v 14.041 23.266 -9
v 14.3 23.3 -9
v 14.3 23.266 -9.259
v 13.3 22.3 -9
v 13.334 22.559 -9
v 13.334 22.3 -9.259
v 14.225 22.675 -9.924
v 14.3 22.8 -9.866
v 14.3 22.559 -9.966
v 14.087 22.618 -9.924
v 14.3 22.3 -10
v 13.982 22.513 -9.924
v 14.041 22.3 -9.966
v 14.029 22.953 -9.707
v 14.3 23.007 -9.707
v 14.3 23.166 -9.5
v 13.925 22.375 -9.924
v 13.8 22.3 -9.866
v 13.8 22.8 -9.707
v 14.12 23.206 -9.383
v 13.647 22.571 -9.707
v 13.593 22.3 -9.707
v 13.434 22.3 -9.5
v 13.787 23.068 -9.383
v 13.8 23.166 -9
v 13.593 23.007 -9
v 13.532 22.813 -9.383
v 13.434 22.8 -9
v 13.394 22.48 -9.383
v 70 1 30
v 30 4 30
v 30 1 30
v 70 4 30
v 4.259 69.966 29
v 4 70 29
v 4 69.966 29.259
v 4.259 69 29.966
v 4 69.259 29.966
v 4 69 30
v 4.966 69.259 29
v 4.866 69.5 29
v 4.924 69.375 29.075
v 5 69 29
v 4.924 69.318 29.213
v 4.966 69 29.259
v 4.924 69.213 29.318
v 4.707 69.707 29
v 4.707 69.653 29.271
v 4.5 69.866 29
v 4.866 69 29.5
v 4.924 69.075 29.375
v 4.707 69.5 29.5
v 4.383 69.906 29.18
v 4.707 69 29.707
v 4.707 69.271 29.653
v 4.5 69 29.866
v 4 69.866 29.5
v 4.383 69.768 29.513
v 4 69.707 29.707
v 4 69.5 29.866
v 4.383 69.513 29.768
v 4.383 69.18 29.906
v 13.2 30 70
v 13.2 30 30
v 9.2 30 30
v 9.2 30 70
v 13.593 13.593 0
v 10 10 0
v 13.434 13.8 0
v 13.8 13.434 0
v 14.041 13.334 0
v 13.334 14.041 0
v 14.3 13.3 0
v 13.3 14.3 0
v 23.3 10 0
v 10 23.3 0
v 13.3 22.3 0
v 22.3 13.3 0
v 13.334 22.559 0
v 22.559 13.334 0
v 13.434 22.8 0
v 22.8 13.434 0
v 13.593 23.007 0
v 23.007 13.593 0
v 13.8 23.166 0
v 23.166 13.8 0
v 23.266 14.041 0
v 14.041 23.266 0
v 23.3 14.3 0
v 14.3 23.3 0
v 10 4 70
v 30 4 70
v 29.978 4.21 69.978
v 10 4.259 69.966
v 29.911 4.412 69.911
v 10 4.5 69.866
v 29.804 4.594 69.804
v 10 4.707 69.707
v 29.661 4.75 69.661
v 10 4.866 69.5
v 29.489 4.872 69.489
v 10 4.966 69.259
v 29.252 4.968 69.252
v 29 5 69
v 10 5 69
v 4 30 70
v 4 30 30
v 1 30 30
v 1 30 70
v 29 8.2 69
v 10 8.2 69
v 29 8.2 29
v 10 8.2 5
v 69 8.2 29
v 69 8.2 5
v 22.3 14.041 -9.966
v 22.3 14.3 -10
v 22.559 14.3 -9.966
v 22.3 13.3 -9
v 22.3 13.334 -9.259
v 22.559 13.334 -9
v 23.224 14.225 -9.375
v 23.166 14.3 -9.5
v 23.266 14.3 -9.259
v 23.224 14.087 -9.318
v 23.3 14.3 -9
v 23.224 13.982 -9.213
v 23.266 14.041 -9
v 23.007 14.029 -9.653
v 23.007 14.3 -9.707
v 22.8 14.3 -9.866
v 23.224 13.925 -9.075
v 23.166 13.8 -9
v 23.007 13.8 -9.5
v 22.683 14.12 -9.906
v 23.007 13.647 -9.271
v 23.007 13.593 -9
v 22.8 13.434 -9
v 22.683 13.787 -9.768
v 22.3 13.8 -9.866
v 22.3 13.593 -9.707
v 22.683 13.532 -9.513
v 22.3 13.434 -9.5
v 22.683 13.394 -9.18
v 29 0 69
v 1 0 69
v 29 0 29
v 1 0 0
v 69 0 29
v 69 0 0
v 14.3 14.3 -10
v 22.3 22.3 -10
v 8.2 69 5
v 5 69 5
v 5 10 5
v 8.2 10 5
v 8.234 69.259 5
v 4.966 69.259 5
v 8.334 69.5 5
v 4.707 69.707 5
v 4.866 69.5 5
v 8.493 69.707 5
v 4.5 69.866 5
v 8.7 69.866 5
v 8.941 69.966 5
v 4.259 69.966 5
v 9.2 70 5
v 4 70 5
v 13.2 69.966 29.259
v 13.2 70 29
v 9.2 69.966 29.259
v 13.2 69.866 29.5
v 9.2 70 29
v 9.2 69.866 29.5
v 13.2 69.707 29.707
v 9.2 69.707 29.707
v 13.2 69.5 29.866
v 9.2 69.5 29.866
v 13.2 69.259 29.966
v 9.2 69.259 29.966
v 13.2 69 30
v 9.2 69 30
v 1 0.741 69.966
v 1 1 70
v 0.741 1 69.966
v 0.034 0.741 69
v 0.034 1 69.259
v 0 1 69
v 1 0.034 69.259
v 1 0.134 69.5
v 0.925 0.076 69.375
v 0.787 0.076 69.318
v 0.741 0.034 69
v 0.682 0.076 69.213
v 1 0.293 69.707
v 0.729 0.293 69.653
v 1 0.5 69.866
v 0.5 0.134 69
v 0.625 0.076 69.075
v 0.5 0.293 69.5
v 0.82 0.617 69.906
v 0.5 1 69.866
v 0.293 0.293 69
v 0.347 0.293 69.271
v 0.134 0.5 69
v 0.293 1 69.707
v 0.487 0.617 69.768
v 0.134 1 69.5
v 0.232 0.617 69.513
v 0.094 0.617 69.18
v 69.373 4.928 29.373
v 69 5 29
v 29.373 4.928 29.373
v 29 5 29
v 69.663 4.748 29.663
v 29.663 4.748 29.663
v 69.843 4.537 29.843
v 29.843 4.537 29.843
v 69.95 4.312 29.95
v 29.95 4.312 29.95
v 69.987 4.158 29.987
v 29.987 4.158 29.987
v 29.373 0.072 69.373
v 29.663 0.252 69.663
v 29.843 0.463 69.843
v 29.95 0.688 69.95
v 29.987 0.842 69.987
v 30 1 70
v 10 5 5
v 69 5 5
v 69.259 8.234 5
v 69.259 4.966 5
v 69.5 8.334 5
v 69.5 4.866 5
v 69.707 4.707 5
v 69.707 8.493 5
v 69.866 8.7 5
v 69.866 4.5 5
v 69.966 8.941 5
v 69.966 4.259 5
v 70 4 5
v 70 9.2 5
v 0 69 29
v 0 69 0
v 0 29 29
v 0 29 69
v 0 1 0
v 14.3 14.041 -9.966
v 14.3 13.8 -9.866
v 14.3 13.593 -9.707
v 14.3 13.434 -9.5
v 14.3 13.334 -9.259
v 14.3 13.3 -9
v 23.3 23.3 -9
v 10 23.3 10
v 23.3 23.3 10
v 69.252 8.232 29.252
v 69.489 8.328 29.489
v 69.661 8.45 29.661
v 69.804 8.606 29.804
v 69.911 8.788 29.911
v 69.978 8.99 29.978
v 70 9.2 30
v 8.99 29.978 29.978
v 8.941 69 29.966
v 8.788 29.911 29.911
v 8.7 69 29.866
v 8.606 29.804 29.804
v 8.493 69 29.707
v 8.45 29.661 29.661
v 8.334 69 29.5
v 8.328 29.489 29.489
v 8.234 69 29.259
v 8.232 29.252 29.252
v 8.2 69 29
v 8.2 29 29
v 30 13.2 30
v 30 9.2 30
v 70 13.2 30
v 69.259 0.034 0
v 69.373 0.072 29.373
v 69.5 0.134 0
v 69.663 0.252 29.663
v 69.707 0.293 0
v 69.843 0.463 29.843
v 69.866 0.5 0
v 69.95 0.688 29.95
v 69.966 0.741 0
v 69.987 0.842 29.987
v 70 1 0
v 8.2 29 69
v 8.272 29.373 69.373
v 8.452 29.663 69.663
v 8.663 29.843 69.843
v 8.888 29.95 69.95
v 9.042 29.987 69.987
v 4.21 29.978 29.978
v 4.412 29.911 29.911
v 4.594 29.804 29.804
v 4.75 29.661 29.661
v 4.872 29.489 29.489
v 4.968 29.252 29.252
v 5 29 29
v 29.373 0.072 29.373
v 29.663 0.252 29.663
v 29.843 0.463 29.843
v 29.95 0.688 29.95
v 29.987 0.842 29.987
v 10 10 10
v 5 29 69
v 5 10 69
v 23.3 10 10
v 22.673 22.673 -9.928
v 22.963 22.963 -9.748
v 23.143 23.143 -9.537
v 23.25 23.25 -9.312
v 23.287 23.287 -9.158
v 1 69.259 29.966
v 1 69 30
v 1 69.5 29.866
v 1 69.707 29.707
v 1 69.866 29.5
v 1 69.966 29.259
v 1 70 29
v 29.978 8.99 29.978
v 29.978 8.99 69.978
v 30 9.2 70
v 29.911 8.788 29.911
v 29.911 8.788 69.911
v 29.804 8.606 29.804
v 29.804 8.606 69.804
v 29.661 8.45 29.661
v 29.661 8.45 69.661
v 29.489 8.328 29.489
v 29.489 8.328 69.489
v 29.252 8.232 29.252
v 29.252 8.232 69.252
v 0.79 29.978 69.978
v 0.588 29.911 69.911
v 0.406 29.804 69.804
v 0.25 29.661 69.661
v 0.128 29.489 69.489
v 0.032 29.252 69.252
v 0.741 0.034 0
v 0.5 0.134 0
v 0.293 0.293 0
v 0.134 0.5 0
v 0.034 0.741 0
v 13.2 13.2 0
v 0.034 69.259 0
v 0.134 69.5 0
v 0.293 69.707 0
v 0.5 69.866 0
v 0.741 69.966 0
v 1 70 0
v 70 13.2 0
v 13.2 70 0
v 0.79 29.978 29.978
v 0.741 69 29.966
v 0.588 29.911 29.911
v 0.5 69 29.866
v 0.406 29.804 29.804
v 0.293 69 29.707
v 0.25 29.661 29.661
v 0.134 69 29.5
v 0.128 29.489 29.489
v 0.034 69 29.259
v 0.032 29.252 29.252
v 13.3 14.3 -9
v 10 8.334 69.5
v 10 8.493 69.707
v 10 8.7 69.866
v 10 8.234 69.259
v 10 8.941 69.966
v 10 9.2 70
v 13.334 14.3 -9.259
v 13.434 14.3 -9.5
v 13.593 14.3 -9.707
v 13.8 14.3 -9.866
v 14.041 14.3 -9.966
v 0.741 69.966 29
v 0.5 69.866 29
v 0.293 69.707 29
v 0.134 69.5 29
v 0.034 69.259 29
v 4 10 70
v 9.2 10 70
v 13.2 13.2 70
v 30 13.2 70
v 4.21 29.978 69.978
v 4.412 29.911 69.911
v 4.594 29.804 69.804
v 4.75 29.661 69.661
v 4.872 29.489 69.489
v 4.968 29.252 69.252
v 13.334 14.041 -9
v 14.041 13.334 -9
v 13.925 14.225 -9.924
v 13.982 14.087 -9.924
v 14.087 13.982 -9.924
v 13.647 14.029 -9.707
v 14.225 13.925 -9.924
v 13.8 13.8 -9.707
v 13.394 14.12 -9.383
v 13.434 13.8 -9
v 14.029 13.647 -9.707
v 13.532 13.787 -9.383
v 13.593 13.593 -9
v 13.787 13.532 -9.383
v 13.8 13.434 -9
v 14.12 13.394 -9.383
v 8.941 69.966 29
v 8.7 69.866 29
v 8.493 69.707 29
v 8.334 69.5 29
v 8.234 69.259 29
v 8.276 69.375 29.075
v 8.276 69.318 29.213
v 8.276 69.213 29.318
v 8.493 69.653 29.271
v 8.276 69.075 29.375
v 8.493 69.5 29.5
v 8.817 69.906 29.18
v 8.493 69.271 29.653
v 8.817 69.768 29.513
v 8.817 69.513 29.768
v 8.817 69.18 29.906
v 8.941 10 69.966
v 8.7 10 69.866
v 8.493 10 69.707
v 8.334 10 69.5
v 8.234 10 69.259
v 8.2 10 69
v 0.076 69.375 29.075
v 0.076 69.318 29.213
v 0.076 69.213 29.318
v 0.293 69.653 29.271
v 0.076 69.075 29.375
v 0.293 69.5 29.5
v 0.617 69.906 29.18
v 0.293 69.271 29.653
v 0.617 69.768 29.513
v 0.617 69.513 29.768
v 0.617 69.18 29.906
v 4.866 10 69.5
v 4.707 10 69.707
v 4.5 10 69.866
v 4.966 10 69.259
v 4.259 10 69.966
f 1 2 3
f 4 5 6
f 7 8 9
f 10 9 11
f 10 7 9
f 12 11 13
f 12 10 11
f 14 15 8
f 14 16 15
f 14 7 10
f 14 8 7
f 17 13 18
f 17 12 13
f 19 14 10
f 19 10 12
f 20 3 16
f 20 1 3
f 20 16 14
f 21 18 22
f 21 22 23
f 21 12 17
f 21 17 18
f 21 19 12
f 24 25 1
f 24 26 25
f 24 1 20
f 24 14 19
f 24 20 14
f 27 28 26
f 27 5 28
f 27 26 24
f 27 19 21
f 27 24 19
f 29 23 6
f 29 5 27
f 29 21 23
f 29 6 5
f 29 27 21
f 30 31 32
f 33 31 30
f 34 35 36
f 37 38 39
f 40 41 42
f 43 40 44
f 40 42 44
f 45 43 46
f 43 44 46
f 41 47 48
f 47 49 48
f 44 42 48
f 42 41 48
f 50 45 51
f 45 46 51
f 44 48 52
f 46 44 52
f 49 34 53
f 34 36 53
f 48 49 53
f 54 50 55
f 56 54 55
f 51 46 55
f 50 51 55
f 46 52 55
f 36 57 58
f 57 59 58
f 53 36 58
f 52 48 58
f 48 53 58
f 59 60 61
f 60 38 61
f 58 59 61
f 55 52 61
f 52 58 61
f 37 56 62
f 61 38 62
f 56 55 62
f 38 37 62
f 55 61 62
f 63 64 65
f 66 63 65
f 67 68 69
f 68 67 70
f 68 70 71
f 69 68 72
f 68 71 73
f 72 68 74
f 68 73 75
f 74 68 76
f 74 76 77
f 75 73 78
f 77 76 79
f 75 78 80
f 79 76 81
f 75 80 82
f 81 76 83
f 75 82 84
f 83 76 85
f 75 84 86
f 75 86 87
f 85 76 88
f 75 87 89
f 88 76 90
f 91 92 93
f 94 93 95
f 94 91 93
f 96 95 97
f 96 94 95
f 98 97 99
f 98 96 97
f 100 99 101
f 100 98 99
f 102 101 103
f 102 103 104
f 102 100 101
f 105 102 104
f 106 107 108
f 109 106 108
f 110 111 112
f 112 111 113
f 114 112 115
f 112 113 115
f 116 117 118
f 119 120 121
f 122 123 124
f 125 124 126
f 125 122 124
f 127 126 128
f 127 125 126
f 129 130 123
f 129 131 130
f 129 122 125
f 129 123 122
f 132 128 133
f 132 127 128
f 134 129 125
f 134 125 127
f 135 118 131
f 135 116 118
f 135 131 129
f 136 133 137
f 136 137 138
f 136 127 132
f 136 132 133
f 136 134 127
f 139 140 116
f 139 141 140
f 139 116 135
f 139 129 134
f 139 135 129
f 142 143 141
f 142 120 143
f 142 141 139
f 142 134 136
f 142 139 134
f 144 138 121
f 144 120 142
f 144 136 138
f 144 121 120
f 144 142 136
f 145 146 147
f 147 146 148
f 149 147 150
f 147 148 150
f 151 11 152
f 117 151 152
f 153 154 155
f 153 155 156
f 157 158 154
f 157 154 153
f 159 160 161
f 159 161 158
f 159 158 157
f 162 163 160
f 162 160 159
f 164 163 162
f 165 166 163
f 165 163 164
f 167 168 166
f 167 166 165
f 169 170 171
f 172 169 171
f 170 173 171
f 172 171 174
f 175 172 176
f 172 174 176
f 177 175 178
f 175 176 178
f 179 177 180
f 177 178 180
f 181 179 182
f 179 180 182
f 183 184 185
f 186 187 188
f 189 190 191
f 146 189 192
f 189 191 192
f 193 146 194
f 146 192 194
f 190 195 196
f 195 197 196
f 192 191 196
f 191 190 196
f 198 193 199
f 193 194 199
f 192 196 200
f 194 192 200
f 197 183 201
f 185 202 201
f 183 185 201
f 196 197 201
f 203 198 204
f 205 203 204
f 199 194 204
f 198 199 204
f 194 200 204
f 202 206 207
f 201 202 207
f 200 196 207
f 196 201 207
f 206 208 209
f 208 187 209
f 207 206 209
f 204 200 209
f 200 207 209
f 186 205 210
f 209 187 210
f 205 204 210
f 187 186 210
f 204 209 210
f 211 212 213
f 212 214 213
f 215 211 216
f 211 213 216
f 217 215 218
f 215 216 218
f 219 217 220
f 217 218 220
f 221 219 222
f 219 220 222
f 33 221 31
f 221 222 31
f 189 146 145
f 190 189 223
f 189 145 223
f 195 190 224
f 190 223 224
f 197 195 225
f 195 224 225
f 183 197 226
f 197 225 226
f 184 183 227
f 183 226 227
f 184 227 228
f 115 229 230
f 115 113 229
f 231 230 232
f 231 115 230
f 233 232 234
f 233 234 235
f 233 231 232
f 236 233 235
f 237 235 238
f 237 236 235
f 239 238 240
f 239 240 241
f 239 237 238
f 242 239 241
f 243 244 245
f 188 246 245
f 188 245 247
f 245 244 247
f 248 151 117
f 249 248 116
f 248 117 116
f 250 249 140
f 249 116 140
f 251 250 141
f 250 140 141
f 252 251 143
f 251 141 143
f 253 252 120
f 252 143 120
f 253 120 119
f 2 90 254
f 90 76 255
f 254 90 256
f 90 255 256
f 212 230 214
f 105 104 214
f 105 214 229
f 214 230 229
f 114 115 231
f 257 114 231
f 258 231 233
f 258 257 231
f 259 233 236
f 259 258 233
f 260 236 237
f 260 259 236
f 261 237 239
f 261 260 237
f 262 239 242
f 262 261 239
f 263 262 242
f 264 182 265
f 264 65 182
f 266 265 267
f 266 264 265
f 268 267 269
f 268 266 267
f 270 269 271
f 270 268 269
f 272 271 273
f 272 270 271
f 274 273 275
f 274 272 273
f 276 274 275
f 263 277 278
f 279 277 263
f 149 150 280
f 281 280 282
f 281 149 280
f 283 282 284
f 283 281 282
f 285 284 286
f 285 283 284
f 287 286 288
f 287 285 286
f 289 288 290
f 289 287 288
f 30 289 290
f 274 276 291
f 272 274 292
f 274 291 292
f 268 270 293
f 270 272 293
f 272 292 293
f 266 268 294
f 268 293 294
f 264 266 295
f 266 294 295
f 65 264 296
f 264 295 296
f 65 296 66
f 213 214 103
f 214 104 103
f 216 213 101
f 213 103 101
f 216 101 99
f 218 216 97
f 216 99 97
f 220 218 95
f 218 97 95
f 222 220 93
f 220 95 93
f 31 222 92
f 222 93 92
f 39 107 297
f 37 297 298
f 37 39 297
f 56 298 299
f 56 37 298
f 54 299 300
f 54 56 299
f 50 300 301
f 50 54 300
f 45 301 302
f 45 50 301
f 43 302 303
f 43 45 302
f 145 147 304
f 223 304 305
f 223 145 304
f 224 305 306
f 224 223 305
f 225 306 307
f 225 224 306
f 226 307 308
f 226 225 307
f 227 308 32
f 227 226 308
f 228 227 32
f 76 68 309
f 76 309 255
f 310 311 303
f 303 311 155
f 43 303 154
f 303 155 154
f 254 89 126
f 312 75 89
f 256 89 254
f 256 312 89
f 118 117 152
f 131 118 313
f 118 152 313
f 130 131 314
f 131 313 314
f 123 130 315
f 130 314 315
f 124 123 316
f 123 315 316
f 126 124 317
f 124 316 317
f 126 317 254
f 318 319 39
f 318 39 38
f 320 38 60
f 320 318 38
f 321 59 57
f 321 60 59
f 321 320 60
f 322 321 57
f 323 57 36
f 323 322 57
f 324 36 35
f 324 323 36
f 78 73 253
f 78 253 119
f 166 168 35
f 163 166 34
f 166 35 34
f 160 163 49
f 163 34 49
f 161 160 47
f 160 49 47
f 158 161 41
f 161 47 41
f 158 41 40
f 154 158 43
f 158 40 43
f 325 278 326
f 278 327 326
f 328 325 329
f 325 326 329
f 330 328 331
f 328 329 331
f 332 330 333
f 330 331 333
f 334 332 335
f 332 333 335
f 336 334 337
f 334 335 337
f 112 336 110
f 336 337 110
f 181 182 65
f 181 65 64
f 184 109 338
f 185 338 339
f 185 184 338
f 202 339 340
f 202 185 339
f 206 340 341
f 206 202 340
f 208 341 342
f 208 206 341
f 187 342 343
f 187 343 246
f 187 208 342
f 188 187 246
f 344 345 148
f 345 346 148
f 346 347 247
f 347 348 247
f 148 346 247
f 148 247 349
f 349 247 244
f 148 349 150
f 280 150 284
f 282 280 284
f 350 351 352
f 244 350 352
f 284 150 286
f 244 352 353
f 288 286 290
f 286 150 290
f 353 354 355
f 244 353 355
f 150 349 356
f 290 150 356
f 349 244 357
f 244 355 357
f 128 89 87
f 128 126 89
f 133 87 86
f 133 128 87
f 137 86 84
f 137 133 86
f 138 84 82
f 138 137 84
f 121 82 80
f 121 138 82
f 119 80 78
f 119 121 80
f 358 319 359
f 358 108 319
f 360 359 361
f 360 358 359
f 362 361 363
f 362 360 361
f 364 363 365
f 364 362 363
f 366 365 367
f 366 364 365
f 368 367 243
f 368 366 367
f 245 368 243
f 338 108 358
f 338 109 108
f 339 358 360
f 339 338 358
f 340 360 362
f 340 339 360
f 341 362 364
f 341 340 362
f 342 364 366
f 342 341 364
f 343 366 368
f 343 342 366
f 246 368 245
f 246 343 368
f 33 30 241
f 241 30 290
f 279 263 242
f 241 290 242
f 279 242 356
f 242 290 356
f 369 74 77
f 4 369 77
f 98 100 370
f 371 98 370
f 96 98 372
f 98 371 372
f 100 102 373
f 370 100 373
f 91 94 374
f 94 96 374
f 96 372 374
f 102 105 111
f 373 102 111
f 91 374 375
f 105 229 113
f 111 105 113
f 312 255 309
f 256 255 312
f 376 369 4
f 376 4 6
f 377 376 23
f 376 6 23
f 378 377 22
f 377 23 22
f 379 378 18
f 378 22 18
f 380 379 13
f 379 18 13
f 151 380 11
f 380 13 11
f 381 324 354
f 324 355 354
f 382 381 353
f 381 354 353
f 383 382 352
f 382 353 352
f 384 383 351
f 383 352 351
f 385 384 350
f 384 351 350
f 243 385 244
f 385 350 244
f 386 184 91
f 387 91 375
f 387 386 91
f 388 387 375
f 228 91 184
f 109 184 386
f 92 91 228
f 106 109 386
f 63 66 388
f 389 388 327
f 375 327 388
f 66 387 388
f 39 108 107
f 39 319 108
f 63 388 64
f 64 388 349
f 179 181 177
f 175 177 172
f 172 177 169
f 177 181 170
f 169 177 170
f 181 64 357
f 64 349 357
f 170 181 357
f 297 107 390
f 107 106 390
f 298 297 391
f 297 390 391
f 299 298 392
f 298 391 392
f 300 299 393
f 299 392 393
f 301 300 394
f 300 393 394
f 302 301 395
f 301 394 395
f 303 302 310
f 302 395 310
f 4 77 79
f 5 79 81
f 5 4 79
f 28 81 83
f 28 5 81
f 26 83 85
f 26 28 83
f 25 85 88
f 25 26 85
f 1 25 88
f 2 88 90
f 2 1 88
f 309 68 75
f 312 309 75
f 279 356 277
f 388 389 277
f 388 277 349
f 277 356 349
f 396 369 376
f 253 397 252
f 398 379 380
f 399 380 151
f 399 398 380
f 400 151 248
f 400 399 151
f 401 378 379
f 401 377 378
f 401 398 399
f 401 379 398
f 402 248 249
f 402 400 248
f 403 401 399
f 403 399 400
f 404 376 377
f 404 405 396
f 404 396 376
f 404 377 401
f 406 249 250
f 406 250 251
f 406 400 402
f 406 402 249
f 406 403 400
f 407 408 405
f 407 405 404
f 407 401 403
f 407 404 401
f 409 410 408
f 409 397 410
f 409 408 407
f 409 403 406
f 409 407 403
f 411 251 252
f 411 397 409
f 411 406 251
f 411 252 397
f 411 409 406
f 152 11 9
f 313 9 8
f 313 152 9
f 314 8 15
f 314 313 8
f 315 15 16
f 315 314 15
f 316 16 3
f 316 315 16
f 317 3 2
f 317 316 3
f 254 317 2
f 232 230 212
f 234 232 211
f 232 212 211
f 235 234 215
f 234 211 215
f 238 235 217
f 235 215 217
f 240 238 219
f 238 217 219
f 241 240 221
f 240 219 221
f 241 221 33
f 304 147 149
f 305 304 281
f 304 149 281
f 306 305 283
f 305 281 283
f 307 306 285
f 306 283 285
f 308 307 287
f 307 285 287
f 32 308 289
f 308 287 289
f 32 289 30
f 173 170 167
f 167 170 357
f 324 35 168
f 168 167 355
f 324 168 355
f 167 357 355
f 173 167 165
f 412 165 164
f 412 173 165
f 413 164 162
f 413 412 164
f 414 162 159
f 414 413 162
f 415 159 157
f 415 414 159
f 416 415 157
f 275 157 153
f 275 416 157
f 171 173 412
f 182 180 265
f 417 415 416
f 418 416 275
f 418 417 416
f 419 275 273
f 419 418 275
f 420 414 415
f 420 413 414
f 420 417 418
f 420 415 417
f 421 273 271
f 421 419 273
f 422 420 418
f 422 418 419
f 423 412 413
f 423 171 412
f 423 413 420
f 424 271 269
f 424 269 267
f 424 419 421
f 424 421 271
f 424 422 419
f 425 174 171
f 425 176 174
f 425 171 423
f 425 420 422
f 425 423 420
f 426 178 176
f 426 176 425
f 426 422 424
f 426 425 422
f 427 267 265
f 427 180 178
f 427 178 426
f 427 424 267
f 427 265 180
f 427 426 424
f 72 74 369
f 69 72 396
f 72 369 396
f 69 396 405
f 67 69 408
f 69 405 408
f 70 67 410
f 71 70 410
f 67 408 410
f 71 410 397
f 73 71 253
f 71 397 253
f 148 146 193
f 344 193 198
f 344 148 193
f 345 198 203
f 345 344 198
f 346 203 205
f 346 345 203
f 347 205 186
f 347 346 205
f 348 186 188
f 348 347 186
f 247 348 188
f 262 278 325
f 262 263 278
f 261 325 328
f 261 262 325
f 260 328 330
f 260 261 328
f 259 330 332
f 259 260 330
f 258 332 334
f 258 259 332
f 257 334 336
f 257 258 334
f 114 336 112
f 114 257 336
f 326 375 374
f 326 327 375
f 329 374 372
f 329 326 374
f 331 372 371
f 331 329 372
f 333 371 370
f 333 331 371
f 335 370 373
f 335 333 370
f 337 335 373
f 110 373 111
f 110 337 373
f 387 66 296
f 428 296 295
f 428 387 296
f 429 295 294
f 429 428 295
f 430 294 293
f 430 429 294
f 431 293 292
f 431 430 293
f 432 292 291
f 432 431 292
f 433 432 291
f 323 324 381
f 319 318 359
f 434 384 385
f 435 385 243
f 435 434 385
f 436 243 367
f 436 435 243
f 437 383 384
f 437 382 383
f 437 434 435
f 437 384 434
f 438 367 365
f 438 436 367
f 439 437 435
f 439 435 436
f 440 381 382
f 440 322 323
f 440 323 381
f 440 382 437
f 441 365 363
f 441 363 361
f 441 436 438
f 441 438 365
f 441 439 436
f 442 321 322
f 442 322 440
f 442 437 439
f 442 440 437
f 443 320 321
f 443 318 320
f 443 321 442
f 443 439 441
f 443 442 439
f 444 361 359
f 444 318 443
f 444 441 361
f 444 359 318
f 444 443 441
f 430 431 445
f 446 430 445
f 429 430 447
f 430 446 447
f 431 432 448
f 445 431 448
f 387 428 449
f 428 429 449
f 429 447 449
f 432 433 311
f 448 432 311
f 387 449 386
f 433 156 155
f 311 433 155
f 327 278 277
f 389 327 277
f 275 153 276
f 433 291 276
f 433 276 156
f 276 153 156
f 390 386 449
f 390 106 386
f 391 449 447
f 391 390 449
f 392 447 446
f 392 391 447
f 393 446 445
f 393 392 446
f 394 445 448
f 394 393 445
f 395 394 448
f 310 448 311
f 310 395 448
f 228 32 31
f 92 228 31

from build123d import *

# Parameters (mm, degrees)
PAD_DEPTH    = 5
PAD001_DEPTH = 25
PAD002_DEPTH = 65
FILLET_R     = 1
SKETCH003_W  = 13.3
SKETCH003_H  = 13.3
PAD003_DEPTH = 10
SKETCH004_W  = 10
SKETCH004_H  = 10
PAD004_DEPTH = 10
FILLET001_R  = 1


with BuildPart() as body:
    # Sketch → Pad (new body)
    with BuildSketch(Plane.XY):
        Polygon((0, 0), (70, 0), (70, 13.2), (13.2, 13.2), (13.2, 70), (0, 70), align=None)
    extrude(amount=PAD_DEPTH)

    # Sketch001 (on DatumPlane) → Pad001 (join)
    with BuildSketch(Plane.XY.offset(5)):
        Polygon((0, 0), (70, 0), (70, 5), (10, 5), (10, 8.2), (70, 8.2), (70, 13.2), (13.2, 13.2), (13.2, 70), (8.2, 70), (8.2, 10), (5, 10), (5, 70), (0, 70), align=None)
    extrude(amount=PAD001_DEPTH)

    # Sketch002 (on DatumPlane) → Pad002 (join)
    with BuildSketch(Plane.XY.offset(5)):
        Polygon((0, 0), (30, 0), (30, 5), (10, 5), (10, 8.2), (30, 8.2), (30, 13.2), (13.2, 13.2), (13.2, 30), (8.2, 30), (8.2, 10), (5, 10), (5, 30), (0, 30), align=None)
    extrude(amount=PAD002_DEPTH)

    # Fillet
    fillet_edges = [body.edges().sort_by_distance(p)[0] for p in [
        (2.5, 70, 30),
        (10.7, 70, 30),
        (8.2, 70, 17.5),
        (5, 70, 17.5),
        (5, 50, 30),
        (8.2, 50, 30),
        (0, 70, 15),
        (0, 50, 30),
        (0, 30, 50),
        (5, 30, 50),
        (8.2, 30, 50),
        (0, 15, 70),
        (5, 20, 70),
        (8.2, 20, 70),
        (15, 0, 70),
        (20, 5, 70),
        (20, 8.2, 70),
        (30, 8.2, 50),
        (50, 8.2, 30),
        (50, 5, 30),
        (30, 5, 50),
        (30, 0, 50),
        (50, 0, 30),
        (70, 0, 15),
        (70, 5, 17.5),
        (70, 8.2, 17.5),
        (0, 0, 35),
    ]]
    fillet(fillet_edges, radius=FILLET_R)


with BuildPart() as body001:
    # Sketch003 → Pad003 (new body)
    with BuildSketch(Plane.XY):
        with Locations((16.65, 16.65)):
            Rectangle(SKETCH003_W, SKETCH003_H)
    extrude(amount=PAD003_DEPTH)

    # Sketch004 → Pad004 (join)
    with BuildSketch(Plane.XY):
        with Locations((18.3, 18.3)):
            Rectangle(SKETCH004_W, SKETCH004_H)
    extrude(amount=-PAD004_DEPTH)

    # Fillet001
    fillet001_edges = [body001.edges().sort_by_distance(p)[0] for p in [
        (13.3, 13.3, -5),
        (13.3, 23.3, -5),
        (18.3, 23.3, -10),
        (13.3, 18.3, -10),
        (18.3, 13.3, -10),
        (23.3, 18.3, -10),
        (23.3, 13.3, -5),
    ]]
    fillet(fillet001_edges, radius=FILLET001_R)


solid = Compound([body.part, body001.part])
